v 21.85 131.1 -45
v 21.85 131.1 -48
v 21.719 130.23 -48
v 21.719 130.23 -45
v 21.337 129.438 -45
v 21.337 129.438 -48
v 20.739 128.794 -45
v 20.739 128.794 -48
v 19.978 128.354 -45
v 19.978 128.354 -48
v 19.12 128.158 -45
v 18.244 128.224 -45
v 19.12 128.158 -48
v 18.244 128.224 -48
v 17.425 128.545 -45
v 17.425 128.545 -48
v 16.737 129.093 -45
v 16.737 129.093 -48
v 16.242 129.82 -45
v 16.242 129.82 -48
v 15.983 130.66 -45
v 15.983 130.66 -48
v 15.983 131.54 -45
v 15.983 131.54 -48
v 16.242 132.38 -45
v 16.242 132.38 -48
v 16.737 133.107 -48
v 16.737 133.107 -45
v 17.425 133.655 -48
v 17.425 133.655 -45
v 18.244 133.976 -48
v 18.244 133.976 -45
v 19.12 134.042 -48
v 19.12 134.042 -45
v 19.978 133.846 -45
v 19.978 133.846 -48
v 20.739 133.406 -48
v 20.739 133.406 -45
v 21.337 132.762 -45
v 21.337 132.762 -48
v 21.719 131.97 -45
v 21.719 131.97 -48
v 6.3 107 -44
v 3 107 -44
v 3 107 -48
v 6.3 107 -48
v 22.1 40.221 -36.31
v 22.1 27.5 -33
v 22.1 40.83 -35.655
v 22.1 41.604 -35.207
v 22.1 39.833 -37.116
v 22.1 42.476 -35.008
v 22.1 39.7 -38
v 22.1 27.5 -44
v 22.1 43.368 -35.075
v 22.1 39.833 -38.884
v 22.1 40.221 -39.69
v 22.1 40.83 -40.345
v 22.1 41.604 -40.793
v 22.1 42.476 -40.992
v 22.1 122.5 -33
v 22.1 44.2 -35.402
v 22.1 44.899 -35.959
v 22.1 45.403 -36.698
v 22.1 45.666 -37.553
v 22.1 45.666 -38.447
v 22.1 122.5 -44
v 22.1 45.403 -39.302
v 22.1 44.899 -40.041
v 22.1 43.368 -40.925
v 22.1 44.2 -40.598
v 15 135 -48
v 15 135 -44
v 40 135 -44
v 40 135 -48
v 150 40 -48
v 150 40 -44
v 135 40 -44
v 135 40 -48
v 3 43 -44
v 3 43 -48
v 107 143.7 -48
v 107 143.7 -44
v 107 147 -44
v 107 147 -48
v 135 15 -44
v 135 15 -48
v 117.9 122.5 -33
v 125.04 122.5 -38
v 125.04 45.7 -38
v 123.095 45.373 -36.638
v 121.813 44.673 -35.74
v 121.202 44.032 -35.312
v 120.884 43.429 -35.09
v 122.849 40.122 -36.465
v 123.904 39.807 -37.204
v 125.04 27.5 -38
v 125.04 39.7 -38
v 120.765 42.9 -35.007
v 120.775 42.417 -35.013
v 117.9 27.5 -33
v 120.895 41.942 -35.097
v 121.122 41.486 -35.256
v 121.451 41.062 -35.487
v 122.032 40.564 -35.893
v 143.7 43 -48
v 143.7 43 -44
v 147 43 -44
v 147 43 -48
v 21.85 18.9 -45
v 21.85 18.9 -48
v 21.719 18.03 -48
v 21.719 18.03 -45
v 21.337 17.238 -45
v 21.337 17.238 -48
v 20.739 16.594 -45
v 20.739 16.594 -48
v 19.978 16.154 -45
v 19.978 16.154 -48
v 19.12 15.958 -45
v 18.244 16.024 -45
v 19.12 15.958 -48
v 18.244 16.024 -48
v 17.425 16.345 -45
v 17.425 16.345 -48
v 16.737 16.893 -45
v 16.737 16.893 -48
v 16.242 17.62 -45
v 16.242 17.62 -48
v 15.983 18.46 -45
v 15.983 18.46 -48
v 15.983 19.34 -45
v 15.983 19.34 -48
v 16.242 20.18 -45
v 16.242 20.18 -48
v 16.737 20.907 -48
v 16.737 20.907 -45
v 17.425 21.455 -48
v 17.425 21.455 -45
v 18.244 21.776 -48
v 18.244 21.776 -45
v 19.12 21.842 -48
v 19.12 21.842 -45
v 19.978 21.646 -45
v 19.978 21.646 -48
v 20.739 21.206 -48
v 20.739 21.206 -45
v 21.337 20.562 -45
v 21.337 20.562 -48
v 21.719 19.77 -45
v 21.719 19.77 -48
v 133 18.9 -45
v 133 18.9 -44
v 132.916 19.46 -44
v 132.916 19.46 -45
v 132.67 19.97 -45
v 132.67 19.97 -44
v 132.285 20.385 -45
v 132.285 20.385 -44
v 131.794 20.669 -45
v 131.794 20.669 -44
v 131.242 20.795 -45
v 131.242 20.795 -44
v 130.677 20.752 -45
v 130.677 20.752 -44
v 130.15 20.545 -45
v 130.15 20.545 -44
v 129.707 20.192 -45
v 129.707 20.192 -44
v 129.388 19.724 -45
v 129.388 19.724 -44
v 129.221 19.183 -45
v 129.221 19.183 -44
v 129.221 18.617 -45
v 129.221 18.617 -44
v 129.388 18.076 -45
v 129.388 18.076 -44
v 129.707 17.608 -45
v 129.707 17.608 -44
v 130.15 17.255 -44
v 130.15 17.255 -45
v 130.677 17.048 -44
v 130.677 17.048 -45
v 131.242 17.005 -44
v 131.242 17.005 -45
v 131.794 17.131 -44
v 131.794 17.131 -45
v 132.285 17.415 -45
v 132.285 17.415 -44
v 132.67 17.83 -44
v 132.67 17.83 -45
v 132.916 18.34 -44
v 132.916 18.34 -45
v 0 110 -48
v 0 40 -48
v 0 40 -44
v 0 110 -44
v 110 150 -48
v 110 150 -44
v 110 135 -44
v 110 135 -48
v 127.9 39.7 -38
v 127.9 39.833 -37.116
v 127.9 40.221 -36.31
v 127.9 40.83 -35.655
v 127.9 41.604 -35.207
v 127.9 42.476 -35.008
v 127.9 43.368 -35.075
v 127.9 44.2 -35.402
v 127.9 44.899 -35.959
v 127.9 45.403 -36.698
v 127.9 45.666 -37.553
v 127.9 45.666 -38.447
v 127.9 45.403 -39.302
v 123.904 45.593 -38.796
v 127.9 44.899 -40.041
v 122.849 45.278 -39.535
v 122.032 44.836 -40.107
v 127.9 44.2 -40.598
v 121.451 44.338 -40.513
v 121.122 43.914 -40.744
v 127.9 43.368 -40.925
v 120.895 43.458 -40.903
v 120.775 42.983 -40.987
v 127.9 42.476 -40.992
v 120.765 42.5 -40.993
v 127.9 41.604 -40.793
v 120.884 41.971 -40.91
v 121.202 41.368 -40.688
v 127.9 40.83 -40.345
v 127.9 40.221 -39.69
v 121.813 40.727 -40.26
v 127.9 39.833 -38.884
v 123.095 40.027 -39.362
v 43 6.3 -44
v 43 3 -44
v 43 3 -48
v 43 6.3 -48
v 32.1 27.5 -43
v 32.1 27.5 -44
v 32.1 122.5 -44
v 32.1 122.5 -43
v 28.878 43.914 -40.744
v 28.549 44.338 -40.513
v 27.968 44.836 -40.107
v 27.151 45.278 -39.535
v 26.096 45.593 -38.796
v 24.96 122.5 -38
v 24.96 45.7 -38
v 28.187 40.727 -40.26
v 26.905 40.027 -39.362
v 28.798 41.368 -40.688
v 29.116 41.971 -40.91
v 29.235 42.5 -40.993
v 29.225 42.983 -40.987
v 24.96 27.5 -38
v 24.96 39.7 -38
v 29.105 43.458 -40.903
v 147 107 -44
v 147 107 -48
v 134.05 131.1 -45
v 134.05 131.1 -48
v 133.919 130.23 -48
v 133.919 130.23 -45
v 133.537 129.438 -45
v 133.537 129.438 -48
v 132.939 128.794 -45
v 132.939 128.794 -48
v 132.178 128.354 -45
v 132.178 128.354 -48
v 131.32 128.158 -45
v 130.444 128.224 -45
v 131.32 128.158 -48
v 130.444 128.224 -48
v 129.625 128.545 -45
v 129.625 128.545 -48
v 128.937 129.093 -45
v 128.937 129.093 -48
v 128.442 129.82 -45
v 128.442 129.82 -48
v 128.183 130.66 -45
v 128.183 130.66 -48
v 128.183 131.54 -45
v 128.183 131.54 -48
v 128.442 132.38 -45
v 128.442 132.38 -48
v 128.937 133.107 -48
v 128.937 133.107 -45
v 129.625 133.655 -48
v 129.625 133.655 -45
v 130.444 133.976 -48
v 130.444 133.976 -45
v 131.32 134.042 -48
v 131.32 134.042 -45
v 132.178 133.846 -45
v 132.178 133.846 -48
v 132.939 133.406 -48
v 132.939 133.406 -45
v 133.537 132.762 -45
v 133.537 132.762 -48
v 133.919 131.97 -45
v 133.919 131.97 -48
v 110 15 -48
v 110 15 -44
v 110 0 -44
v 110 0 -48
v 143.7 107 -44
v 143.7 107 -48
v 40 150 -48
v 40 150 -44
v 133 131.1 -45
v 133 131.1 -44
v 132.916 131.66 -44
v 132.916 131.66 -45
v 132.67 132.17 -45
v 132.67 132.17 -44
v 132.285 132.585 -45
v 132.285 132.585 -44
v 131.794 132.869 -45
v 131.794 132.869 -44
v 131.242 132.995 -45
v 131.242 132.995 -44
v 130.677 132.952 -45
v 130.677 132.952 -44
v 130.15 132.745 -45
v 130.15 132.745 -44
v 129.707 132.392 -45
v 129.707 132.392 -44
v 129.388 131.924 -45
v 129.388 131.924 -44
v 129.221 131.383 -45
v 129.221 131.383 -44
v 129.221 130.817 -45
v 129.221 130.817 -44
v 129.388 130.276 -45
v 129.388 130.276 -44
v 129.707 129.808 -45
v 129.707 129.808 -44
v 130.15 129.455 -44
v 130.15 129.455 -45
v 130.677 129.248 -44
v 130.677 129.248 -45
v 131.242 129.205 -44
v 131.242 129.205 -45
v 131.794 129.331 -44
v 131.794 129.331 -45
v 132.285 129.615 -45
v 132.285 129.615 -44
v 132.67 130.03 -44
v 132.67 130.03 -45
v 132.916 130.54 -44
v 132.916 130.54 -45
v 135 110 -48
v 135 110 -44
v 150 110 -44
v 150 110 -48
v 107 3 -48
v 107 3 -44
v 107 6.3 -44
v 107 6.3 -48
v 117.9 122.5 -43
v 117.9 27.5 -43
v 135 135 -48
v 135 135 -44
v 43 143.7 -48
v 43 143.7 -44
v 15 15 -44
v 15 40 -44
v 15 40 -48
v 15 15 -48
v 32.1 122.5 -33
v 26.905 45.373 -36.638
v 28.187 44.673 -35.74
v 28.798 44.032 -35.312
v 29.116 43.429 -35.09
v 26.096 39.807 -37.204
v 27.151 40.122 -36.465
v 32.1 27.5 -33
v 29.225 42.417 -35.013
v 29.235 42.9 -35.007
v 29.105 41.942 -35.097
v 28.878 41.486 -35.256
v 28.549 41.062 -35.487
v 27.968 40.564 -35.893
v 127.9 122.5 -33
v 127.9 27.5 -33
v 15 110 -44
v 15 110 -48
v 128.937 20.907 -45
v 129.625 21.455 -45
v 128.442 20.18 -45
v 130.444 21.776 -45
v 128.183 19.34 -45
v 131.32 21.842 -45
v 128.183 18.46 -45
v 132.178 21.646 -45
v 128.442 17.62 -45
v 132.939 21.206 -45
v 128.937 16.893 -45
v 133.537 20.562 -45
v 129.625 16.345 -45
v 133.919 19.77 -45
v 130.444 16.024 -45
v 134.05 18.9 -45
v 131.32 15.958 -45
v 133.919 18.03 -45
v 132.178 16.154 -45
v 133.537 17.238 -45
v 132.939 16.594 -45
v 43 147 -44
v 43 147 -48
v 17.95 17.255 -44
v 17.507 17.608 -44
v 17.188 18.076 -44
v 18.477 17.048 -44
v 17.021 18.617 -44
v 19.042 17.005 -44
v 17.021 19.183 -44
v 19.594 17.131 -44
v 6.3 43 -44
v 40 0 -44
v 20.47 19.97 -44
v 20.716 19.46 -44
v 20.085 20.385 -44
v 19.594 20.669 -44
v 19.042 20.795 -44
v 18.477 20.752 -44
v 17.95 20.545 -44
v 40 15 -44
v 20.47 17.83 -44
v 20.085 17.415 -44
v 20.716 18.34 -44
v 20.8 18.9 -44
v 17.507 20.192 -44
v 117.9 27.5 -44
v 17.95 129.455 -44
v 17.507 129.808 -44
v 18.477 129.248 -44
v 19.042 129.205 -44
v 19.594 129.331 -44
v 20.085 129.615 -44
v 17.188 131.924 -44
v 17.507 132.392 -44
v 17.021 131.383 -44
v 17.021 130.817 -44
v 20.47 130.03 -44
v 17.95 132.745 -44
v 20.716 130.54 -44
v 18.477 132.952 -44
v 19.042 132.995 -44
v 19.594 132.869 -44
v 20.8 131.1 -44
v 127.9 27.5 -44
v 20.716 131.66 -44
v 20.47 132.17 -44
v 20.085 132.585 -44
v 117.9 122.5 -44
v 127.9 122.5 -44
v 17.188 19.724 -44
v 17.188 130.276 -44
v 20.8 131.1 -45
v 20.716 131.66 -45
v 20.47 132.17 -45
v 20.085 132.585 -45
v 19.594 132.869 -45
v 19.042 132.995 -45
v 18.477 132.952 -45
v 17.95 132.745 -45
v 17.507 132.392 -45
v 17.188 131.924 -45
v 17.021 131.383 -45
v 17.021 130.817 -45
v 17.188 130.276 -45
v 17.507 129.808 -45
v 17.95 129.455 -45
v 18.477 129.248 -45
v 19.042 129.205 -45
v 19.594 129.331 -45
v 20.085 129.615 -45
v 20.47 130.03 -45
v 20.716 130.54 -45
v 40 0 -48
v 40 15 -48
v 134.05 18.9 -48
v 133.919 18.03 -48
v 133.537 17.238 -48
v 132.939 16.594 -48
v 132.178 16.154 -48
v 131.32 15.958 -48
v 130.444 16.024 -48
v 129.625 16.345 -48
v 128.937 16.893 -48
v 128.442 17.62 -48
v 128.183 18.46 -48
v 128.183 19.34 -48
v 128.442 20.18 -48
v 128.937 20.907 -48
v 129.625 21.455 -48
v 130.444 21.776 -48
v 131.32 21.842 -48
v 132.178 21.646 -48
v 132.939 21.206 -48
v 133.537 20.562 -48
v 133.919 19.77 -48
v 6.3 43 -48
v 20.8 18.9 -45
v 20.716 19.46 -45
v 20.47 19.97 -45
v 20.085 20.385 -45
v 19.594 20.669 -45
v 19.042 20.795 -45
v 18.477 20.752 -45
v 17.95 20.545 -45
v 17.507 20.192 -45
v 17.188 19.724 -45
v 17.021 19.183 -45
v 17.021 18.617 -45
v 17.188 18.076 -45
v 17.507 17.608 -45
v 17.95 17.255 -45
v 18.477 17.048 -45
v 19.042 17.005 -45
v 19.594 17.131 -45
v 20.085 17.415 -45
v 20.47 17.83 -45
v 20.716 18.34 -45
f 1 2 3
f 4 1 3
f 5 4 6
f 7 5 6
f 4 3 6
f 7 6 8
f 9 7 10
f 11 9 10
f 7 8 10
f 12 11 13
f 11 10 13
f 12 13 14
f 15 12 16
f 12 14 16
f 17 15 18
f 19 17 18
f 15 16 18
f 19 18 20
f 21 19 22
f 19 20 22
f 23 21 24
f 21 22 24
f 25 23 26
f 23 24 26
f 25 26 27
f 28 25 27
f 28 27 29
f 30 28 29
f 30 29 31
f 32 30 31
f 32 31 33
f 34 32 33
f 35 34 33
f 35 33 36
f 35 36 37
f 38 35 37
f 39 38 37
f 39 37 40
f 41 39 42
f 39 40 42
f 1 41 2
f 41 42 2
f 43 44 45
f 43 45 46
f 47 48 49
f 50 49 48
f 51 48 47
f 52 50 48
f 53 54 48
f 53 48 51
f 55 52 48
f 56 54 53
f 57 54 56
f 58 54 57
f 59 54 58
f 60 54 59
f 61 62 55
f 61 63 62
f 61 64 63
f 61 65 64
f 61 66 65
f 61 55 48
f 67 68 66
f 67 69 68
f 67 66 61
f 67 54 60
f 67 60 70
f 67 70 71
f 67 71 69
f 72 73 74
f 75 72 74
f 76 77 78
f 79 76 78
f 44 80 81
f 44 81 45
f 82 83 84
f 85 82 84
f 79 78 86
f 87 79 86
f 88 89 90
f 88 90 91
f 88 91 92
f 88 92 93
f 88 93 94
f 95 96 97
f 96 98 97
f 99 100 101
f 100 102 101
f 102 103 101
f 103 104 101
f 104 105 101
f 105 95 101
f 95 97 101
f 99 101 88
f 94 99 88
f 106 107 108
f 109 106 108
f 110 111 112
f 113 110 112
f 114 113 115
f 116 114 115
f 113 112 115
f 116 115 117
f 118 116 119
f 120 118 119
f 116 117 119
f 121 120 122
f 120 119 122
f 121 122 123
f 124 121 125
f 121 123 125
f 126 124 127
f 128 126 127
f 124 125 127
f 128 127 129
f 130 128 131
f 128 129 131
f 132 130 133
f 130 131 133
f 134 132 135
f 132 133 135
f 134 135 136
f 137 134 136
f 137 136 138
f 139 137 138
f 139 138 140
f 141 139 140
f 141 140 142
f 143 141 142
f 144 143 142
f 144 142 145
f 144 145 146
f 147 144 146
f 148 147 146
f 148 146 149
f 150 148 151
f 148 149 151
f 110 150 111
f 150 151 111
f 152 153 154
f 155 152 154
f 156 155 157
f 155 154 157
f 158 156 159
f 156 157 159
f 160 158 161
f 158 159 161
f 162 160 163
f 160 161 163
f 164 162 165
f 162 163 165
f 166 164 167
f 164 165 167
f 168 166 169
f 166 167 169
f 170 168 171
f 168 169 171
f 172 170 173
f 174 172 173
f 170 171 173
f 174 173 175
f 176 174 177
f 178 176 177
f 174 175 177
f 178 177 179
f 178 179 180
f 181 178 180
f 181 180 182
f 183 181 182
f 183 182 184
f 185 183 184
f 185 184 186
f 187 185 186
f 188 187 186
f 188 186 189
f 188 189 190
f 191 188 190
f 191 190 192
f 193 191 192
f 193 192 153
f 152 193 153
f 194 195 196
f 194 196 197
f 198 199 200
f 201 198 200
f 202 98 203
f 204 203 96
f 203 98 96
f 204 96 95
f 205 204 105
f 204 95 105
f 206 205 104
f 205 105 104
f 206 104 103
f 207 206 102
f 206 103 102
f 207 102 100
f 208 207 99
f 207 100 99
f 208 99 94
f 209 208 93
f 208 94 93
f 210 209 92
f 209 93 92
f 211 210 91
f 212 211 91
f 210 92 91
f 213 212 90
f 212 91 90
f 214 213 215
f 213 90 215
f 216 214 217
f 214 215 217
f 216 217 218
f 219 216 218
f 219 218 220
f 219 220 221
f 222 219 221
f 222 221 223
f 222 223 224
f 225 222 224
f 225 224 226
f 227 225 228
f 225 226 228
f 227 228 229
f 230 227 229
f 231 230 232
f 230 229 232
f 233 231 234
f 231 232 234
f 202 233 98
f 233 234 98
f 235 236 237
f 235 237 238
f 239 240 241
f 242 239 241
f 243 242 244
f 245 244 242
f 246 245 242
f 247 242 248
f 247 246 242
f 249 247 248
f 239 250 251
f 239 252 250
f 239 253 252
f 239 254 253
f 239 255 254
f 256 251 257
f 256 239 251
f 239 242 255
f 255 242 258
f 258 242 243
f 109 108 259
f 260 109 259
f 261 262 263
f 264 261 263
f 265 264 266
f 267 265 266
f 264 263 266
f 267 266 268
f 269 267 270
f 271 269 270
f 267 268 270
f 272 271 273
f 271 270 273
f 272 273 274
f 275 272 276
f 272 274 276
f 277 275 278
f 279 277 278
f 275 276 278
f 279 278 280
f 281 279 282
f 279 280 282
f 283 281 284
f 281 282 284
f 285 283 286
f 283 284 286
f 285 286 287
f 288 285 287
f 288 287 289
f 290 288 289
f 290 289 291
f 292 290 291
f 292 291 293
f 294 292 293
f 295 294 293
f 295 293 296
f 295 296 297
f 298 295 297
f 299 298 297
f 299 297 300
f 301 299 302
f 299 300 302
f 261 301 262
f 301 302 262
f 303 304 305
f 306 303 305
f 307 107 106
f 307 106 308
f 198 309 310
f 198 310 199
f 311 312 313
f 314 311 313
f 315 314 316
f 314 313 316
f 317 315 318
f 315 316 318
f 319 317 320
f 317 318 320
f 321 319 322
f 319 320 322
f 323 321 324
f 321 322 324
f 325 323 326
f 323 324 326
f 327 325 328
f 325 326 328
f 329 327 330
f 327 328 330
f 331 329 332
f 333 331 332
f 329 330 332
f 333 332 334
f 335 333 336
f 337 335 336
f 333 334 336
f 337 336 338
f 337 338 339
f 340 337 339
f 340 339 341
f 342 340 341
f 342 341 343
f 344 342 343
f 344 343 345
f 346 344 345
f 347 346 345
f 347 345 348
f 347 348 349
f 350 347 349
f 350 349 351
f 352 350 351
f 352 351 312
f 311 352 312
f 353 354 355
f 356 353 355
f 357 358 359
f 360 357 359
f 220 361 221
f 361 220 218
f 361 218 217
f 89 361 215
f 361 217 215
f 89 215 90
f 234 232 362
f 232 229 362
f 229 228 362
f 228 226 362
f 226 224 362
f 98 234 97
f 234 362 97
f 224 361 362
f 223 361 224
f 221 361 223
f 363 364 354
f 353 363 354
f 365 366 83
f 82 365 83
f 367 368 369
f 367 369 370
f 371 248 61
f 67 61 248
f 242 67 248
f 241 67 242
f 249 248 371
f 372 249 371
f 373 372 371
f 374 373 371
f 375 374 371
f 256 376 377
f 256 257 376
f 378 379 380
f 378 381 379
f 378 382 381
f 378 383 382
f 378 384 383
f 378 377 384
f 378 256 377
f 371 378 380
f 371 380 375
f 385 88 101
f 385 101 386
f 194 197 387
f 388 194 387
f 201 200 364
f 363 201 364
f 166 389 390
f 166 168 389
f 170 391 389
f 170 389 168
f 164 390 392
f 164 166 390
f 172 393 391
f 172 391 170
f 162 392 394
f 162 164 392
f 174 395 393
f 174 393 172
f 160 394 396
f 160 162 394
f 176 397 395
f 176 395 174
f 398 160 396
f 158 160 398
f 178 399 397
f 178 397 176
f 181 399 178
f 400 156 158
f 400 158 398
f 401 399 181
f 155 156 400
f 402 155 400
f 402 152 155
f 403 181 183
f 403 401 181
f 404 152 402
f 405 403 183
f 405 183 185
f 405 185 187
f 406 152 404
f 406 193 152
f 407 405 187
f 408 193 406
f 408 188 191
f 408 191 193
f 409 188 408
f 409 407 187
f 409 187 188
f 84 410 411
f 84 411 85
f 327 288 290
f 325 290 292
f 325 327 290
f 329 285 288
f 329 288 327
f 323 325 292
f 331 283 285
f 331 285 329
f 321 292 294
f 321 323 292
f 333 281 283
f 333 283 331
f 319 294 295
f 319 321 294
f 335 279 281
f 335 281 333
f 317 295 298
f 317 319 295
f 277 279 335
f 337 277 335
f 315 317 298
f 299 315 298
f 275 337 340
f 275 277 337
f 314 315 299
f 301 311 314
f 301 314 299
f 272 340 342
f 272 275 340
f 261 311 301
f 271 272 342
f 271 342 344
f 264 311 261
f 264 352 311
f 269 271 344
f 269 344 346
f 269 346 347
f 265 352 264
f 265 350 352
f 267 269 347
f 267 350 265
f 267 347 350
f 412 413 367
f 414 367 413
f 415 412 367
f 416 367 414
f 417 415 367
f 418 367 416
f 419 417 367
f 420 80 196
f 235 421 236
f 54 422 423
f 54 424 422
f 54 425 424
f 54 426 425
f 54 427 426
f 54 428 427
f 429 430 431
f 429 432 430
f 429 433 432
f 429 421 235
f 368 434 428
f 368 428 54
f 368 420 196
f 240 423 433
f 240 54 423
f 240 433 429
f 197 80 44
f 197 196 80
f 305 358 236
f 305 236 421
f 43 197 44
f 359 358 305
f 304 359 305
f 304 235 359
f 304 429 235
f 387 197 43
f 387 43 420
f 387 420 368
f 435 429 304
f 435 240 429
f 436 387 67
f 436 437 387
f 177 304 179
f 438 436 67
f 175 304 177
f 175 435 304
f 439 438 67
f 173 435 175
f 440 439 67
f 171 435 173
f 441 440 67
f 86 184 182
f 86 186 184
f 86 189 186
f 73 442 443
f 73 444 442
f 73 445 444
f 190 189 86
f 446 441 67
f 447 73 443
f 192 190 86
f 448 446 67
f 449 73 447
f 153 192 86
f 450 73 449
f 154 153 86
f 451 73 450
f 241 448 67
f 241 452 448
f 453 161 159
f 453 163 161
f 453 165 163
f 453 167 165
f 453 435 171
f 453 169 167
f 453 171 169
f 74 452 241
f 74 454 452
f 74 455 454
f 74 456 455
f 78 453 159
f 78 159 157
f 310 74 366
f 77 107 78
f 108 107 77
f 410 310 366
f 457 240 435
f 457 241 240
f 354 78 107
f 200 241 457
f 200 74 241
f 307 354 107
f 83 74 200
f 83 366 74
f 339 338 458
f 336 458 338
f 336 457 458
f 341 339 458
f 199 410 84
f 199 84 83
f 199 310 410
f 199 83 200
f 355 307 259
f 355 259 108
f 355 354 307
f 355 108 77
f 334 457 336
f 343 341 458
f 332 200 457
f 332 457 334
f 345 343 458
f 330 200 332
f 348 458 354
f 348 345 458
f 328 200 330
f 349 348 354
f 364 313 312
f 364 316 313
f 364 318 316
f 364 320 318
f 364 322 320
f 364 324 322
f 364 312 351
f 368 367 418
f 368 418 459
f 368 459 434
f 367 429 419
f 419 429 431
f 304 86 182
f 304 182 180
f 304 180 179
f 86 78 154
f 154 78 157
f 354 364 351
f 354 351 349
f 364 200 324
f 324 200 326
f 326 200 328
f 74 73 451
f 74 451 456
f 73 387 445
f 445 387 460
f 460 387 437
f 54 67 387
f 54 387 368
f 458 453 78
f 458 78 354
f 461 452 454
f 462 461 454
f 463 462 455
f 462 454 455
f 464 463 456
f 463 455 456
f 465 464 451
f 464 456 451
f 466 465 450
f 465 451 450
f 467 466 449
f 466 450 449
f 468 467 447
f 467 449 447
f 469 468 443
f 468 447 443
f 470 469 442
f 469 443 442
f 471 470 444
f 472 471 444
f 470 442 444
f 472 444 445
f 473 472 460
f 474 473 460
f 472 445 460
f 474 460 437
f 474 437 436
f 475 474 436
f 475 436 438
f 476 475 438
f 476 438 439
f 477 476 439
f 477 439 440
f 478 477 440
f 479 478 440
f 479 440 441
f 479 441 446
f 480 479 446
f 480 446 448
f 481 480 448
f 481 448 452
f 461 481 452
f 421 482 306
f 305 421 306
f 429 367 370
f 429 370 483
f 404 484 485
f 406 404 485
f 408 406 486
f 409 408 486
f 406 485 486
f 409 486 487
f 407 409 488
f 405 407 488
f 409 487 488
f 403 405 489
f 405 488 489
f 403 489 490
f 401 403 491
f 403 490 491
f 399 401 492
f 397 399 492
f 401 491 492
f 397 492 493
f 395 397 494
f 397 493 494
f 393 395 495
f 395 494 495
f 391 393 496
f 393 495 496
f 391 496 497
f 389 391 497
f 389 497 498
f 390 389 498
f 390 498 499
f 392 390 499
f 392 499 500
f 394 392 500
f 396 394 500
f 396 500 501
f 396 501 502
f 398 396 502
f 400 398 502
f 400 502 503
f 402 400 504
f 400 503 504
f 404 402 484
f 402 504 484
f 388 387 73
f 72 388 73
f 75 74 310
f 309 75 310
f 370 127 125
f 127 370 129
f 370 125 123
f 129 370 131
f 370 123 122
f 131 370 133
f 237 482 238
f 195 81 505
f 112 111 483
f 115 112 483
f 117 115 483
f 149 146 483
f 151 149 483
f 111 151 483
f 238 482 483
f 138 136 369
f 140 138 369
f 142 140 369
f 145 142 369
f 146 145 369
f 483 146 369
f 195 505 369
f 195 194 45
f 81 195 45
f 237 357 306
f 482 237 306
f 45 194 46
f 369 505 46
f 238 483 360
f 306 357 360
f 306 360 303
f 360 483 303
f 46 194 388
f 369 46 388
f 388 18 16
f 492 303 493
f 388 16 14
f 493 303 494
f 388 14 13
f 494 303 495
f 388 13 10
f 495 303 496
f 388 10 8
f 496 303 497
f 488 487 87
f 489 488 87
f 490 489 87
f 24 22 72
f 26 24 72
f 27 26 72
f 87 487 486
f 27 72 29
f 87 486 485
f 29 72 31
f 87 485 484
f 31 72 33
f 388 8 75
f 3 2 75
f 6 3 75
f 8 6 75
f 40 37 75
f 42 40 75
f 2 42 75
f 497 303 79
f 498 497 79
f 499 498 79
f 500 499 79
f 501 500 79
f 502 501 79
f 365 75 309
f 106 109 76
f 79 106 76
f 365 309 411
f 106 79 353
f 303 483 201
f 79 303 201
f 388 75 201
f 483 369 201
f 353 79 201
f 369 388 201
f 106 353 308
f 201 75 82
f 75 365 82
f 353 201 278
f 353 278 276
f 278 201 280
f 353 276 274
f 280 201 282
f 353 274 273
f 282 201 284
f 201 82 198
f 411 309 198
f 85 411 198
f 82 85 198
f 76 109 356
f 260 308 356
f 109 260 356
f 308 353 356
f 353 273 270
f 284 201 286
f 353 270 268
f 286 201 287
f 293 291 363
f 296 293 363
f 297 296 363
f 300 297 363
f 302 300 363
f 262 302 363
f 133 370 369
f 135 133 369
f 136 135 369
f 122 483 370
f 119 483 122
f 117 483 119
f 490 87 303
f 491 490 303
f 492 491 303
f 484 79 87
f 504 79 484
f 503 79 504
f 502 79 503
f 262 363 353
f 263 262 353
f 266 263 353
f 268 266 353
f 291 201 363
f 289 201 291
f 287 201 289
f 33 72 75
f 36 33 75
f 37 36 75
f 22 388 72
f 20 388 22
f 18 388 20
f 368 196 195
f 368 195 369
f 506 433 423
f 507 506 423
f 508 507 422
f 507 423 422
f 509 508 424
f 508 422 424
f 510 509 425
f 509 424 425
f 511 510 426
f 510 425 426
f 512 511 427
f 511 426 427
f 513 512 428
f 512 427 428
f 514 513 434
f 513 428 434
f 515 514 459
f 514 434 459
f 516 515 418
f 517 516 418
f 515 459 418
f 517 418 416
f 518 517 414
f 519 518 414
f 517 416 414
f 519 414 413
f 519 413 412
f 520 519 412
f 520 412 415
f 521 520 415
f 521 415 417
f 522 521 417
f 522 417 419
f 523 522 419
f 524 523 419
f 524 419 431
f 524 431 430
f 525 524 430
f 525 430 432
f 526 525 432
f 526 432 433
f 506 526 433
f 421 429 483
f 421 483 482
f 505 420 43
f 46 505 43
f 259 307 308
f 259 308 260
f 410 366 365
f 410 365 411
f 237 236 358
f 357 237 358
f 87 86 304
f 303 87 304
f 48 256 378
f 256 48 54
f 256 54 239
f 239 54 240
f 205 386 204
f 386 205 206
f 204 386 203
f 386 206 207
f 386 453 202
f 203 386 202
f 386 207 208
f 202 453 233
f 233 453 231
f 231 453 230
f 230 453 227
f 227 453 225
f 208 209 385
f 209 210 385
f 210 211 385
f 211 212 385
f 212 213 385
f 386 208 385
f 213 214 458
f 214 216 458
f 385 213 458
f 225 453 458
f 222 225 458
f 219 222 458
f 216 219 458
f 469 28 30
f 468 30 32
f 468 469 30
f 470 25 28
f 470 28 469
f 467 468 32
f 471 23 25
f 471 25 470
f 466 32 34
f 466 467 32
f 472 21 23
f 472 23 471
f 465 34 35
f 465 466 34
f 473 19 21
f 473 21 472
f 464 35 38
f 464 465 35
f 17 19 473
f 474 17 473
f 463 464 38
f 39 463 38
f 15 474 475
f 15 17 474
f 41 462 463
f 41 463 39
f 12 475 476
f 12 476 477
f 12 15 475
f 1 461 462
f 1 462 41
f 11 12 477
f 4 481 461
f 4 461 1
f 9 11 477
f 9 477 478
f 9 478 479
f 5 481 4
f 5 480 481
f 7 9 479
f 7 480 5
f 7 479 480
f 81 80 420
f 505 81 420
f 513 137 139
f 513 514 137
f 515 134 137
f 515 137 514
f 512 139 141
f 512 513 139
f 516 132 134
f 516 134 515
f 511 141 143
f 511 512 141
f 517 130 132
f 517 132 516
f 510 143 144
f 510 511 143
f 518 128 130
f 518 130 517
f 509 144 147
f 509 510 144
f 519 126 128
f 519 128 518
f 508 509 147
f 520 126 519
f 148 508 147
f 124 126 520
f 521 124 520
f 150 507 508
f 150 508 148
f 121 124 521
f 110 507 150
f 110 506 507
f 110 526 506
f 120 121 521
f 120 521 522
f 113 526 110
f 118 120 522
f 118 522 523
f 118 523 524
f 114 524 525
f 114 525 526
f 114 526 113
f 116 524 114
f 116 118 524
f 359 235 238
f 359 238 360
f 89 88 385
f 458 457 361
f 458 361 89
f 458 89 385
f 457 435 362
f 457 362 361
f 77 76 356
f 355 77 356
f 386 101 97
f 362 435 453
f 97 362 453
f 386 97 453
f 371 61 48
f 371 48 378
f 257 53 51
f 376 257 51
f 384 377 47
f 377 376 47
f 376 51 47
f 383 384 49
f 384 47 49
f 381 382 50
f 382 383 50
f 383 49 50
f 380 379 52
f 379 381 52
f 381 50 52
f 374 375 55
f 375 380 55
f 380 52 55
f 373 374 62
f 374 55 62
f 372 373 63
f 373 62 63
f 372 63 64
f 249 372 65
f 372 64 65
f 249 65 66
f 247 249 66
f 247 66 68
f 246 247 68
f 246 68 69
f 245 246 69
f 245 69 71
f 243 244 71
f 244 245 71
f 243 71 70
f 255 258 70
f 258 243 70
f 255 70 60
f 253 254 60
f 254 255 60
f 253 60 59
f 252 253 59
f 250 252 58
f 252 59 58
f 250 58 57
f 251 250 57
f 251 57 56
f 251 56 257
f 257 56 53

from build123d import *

# Parameters (mm, degrees)
SKETCH_W        = 150
SKETCH_H        = 150
PAD_DEPTH       = 4
POCKET_DEPTH    = 4.001
SKETCH002_R     = 1.9
SKETCH002_W     = 3.3
SKETCH002_H     = 64
SKETCH002_W_2   = 64
SKETCH002_H_2   = 3.3
POCKET001_DEPTH = 5
SKETCH003_R     = 2.95
POCKET002_DEPTH = 3
SKETCH004_W     = 10
SKETCH004_H     = 95
PAD001_DEPTH    = 11
POCKET003_DEPTH = 122.501
SKETCH006_R     = 3
POCKET004_DEPTH = 127.901


with BuildPart() as part:
    # Sketch → Pad (new body)
    with BuildSketch(Plane.XY):
        with Locations((75, 75)):
            Rectangle(SKETCH_W, SKETCH_H)
    extrude(amount=PAD_DEPTH)

    # Sketch001 (on Face6 of Pad) → Pocket (cut, through all)
    with BuildSketch(Plane.XY.offset(4)):
        Polygon((0, 110), (15, 110), (15, 135), (40, 135), (40, 150), (0, 150), align=None)
        Polygon((0, 40), (15, 40), (15, 15), (40, 15), (40, 0), (0, 0), align=None)
        Polygon((110, 150), (110, 135), (135, 135), (135, 110), (150, 110), (150, 150), align=None)
        Polygon((150, 40), (135, 40), (135, 15), (110, 15), (110, 0), (150, 0), align=None)
    extrude(amount=-POCKET_DEPTH, mode=Mode.SUBTRACT)

    # Sketch002 (on Face4 of Pocket) → Pocket001 (cut)
    with BuildSketch(Plane.XY.offset(4)):
        with Locations((18.9, 131.1)):
            Circle(SKETCH002_R)
        with Locations((131.1, 131.1)):
            Circle(SKETCH002_R)
        with Locations((131.1, 18.9)):
            Circle(SKETCH002_R)
        with Locations((18.9, 18.9)):
            Circle(SKETCH002_R)
        with Locations((4.65, 75)):
            Rectangle(SKETCH002_W, SKETCH002_H)
        with Locations((75, 145.35)):
            Rectangle(SKETCH002_W_2, SKETCH002_H_2)
        with Locations((145.35, 75)):
            Rectangle(SKETCH002_W, SKETCH002_H)
        with Locations((75, 4.65)):
            Rectangle(SKETCH002_W_2, SKETCH002_H_2)
    extrude(amount=-POCKET001_DEPTH, mode=Mode.SUBTRACT)

    # Sketch003 (on Face2 of Pocket001) → Pocket002 (cut)
    with BuildSketch(Plane(origin=(0, 0, 0), x_dir=(1, 0, 0), z_dir=(0, 0, -1))):
        with Locations((18.9, -131.1)):
            Circle(SKETCH003_R)
        with Locations((18.9, -18.9)):
            Circle(SKETCH003_R)
        with Locations((131.1, -18.9)):
            Circle(SKETCH003_R)
        with Locations((131.1, -131.1)):
            Circle(SKETCH003_R)
    extrude(amount=-POCKET002_DEPTH, mode=Mode.SUBTRACT)

    # Sketch004 (on Face4 of Pocket002) → Pad001 (join)
    with BuildSketch(Plane.XY.offset(4)):
        with Locations((27.1, 75)):
            Rectangle(SKETCH004_W, SKETCH004_H)
        with Locations((122.9, 75)):
            Rectangle(SKETCH004_W, SKETCH004_H)
    extrude(amount=PAD001_DEPTH)

    # Sketch005 (on Face52 of Pad001) → Pocket003 (cut, through all)
    with BuildSketch(Plane.XZ.offset(-27.5)):
        Polygon((24.96, 10), (32.1, 15), (32.1, 5), align=None)
        Polygon((117.9, 5), (125.04, 10), (117.9, 15), align=None)
    extrude(amount=-POCKET003_DEPTH, mode=Mode.SUBTRACT)

    # Sketch006 (on Face53 of Pocket003) → Pocket004 (cut, through all)
    with BuildSketch(Plane(origin=(22.1, 0, 0), x_dir=(0, -1, 0), z_dir=(-1, 0, 0))):
        with Locations((-42.7, 10)):
            Circle(SKETCH006_R)
    extrude(amount=-POCKET004_DEPTH, mode=Mode.SUBTRACT)


with BuildPart() as part_1:
    # Body placement: moved
    add(part.part.moved(Location((0, 0, -48))))


solid = part_1.part
